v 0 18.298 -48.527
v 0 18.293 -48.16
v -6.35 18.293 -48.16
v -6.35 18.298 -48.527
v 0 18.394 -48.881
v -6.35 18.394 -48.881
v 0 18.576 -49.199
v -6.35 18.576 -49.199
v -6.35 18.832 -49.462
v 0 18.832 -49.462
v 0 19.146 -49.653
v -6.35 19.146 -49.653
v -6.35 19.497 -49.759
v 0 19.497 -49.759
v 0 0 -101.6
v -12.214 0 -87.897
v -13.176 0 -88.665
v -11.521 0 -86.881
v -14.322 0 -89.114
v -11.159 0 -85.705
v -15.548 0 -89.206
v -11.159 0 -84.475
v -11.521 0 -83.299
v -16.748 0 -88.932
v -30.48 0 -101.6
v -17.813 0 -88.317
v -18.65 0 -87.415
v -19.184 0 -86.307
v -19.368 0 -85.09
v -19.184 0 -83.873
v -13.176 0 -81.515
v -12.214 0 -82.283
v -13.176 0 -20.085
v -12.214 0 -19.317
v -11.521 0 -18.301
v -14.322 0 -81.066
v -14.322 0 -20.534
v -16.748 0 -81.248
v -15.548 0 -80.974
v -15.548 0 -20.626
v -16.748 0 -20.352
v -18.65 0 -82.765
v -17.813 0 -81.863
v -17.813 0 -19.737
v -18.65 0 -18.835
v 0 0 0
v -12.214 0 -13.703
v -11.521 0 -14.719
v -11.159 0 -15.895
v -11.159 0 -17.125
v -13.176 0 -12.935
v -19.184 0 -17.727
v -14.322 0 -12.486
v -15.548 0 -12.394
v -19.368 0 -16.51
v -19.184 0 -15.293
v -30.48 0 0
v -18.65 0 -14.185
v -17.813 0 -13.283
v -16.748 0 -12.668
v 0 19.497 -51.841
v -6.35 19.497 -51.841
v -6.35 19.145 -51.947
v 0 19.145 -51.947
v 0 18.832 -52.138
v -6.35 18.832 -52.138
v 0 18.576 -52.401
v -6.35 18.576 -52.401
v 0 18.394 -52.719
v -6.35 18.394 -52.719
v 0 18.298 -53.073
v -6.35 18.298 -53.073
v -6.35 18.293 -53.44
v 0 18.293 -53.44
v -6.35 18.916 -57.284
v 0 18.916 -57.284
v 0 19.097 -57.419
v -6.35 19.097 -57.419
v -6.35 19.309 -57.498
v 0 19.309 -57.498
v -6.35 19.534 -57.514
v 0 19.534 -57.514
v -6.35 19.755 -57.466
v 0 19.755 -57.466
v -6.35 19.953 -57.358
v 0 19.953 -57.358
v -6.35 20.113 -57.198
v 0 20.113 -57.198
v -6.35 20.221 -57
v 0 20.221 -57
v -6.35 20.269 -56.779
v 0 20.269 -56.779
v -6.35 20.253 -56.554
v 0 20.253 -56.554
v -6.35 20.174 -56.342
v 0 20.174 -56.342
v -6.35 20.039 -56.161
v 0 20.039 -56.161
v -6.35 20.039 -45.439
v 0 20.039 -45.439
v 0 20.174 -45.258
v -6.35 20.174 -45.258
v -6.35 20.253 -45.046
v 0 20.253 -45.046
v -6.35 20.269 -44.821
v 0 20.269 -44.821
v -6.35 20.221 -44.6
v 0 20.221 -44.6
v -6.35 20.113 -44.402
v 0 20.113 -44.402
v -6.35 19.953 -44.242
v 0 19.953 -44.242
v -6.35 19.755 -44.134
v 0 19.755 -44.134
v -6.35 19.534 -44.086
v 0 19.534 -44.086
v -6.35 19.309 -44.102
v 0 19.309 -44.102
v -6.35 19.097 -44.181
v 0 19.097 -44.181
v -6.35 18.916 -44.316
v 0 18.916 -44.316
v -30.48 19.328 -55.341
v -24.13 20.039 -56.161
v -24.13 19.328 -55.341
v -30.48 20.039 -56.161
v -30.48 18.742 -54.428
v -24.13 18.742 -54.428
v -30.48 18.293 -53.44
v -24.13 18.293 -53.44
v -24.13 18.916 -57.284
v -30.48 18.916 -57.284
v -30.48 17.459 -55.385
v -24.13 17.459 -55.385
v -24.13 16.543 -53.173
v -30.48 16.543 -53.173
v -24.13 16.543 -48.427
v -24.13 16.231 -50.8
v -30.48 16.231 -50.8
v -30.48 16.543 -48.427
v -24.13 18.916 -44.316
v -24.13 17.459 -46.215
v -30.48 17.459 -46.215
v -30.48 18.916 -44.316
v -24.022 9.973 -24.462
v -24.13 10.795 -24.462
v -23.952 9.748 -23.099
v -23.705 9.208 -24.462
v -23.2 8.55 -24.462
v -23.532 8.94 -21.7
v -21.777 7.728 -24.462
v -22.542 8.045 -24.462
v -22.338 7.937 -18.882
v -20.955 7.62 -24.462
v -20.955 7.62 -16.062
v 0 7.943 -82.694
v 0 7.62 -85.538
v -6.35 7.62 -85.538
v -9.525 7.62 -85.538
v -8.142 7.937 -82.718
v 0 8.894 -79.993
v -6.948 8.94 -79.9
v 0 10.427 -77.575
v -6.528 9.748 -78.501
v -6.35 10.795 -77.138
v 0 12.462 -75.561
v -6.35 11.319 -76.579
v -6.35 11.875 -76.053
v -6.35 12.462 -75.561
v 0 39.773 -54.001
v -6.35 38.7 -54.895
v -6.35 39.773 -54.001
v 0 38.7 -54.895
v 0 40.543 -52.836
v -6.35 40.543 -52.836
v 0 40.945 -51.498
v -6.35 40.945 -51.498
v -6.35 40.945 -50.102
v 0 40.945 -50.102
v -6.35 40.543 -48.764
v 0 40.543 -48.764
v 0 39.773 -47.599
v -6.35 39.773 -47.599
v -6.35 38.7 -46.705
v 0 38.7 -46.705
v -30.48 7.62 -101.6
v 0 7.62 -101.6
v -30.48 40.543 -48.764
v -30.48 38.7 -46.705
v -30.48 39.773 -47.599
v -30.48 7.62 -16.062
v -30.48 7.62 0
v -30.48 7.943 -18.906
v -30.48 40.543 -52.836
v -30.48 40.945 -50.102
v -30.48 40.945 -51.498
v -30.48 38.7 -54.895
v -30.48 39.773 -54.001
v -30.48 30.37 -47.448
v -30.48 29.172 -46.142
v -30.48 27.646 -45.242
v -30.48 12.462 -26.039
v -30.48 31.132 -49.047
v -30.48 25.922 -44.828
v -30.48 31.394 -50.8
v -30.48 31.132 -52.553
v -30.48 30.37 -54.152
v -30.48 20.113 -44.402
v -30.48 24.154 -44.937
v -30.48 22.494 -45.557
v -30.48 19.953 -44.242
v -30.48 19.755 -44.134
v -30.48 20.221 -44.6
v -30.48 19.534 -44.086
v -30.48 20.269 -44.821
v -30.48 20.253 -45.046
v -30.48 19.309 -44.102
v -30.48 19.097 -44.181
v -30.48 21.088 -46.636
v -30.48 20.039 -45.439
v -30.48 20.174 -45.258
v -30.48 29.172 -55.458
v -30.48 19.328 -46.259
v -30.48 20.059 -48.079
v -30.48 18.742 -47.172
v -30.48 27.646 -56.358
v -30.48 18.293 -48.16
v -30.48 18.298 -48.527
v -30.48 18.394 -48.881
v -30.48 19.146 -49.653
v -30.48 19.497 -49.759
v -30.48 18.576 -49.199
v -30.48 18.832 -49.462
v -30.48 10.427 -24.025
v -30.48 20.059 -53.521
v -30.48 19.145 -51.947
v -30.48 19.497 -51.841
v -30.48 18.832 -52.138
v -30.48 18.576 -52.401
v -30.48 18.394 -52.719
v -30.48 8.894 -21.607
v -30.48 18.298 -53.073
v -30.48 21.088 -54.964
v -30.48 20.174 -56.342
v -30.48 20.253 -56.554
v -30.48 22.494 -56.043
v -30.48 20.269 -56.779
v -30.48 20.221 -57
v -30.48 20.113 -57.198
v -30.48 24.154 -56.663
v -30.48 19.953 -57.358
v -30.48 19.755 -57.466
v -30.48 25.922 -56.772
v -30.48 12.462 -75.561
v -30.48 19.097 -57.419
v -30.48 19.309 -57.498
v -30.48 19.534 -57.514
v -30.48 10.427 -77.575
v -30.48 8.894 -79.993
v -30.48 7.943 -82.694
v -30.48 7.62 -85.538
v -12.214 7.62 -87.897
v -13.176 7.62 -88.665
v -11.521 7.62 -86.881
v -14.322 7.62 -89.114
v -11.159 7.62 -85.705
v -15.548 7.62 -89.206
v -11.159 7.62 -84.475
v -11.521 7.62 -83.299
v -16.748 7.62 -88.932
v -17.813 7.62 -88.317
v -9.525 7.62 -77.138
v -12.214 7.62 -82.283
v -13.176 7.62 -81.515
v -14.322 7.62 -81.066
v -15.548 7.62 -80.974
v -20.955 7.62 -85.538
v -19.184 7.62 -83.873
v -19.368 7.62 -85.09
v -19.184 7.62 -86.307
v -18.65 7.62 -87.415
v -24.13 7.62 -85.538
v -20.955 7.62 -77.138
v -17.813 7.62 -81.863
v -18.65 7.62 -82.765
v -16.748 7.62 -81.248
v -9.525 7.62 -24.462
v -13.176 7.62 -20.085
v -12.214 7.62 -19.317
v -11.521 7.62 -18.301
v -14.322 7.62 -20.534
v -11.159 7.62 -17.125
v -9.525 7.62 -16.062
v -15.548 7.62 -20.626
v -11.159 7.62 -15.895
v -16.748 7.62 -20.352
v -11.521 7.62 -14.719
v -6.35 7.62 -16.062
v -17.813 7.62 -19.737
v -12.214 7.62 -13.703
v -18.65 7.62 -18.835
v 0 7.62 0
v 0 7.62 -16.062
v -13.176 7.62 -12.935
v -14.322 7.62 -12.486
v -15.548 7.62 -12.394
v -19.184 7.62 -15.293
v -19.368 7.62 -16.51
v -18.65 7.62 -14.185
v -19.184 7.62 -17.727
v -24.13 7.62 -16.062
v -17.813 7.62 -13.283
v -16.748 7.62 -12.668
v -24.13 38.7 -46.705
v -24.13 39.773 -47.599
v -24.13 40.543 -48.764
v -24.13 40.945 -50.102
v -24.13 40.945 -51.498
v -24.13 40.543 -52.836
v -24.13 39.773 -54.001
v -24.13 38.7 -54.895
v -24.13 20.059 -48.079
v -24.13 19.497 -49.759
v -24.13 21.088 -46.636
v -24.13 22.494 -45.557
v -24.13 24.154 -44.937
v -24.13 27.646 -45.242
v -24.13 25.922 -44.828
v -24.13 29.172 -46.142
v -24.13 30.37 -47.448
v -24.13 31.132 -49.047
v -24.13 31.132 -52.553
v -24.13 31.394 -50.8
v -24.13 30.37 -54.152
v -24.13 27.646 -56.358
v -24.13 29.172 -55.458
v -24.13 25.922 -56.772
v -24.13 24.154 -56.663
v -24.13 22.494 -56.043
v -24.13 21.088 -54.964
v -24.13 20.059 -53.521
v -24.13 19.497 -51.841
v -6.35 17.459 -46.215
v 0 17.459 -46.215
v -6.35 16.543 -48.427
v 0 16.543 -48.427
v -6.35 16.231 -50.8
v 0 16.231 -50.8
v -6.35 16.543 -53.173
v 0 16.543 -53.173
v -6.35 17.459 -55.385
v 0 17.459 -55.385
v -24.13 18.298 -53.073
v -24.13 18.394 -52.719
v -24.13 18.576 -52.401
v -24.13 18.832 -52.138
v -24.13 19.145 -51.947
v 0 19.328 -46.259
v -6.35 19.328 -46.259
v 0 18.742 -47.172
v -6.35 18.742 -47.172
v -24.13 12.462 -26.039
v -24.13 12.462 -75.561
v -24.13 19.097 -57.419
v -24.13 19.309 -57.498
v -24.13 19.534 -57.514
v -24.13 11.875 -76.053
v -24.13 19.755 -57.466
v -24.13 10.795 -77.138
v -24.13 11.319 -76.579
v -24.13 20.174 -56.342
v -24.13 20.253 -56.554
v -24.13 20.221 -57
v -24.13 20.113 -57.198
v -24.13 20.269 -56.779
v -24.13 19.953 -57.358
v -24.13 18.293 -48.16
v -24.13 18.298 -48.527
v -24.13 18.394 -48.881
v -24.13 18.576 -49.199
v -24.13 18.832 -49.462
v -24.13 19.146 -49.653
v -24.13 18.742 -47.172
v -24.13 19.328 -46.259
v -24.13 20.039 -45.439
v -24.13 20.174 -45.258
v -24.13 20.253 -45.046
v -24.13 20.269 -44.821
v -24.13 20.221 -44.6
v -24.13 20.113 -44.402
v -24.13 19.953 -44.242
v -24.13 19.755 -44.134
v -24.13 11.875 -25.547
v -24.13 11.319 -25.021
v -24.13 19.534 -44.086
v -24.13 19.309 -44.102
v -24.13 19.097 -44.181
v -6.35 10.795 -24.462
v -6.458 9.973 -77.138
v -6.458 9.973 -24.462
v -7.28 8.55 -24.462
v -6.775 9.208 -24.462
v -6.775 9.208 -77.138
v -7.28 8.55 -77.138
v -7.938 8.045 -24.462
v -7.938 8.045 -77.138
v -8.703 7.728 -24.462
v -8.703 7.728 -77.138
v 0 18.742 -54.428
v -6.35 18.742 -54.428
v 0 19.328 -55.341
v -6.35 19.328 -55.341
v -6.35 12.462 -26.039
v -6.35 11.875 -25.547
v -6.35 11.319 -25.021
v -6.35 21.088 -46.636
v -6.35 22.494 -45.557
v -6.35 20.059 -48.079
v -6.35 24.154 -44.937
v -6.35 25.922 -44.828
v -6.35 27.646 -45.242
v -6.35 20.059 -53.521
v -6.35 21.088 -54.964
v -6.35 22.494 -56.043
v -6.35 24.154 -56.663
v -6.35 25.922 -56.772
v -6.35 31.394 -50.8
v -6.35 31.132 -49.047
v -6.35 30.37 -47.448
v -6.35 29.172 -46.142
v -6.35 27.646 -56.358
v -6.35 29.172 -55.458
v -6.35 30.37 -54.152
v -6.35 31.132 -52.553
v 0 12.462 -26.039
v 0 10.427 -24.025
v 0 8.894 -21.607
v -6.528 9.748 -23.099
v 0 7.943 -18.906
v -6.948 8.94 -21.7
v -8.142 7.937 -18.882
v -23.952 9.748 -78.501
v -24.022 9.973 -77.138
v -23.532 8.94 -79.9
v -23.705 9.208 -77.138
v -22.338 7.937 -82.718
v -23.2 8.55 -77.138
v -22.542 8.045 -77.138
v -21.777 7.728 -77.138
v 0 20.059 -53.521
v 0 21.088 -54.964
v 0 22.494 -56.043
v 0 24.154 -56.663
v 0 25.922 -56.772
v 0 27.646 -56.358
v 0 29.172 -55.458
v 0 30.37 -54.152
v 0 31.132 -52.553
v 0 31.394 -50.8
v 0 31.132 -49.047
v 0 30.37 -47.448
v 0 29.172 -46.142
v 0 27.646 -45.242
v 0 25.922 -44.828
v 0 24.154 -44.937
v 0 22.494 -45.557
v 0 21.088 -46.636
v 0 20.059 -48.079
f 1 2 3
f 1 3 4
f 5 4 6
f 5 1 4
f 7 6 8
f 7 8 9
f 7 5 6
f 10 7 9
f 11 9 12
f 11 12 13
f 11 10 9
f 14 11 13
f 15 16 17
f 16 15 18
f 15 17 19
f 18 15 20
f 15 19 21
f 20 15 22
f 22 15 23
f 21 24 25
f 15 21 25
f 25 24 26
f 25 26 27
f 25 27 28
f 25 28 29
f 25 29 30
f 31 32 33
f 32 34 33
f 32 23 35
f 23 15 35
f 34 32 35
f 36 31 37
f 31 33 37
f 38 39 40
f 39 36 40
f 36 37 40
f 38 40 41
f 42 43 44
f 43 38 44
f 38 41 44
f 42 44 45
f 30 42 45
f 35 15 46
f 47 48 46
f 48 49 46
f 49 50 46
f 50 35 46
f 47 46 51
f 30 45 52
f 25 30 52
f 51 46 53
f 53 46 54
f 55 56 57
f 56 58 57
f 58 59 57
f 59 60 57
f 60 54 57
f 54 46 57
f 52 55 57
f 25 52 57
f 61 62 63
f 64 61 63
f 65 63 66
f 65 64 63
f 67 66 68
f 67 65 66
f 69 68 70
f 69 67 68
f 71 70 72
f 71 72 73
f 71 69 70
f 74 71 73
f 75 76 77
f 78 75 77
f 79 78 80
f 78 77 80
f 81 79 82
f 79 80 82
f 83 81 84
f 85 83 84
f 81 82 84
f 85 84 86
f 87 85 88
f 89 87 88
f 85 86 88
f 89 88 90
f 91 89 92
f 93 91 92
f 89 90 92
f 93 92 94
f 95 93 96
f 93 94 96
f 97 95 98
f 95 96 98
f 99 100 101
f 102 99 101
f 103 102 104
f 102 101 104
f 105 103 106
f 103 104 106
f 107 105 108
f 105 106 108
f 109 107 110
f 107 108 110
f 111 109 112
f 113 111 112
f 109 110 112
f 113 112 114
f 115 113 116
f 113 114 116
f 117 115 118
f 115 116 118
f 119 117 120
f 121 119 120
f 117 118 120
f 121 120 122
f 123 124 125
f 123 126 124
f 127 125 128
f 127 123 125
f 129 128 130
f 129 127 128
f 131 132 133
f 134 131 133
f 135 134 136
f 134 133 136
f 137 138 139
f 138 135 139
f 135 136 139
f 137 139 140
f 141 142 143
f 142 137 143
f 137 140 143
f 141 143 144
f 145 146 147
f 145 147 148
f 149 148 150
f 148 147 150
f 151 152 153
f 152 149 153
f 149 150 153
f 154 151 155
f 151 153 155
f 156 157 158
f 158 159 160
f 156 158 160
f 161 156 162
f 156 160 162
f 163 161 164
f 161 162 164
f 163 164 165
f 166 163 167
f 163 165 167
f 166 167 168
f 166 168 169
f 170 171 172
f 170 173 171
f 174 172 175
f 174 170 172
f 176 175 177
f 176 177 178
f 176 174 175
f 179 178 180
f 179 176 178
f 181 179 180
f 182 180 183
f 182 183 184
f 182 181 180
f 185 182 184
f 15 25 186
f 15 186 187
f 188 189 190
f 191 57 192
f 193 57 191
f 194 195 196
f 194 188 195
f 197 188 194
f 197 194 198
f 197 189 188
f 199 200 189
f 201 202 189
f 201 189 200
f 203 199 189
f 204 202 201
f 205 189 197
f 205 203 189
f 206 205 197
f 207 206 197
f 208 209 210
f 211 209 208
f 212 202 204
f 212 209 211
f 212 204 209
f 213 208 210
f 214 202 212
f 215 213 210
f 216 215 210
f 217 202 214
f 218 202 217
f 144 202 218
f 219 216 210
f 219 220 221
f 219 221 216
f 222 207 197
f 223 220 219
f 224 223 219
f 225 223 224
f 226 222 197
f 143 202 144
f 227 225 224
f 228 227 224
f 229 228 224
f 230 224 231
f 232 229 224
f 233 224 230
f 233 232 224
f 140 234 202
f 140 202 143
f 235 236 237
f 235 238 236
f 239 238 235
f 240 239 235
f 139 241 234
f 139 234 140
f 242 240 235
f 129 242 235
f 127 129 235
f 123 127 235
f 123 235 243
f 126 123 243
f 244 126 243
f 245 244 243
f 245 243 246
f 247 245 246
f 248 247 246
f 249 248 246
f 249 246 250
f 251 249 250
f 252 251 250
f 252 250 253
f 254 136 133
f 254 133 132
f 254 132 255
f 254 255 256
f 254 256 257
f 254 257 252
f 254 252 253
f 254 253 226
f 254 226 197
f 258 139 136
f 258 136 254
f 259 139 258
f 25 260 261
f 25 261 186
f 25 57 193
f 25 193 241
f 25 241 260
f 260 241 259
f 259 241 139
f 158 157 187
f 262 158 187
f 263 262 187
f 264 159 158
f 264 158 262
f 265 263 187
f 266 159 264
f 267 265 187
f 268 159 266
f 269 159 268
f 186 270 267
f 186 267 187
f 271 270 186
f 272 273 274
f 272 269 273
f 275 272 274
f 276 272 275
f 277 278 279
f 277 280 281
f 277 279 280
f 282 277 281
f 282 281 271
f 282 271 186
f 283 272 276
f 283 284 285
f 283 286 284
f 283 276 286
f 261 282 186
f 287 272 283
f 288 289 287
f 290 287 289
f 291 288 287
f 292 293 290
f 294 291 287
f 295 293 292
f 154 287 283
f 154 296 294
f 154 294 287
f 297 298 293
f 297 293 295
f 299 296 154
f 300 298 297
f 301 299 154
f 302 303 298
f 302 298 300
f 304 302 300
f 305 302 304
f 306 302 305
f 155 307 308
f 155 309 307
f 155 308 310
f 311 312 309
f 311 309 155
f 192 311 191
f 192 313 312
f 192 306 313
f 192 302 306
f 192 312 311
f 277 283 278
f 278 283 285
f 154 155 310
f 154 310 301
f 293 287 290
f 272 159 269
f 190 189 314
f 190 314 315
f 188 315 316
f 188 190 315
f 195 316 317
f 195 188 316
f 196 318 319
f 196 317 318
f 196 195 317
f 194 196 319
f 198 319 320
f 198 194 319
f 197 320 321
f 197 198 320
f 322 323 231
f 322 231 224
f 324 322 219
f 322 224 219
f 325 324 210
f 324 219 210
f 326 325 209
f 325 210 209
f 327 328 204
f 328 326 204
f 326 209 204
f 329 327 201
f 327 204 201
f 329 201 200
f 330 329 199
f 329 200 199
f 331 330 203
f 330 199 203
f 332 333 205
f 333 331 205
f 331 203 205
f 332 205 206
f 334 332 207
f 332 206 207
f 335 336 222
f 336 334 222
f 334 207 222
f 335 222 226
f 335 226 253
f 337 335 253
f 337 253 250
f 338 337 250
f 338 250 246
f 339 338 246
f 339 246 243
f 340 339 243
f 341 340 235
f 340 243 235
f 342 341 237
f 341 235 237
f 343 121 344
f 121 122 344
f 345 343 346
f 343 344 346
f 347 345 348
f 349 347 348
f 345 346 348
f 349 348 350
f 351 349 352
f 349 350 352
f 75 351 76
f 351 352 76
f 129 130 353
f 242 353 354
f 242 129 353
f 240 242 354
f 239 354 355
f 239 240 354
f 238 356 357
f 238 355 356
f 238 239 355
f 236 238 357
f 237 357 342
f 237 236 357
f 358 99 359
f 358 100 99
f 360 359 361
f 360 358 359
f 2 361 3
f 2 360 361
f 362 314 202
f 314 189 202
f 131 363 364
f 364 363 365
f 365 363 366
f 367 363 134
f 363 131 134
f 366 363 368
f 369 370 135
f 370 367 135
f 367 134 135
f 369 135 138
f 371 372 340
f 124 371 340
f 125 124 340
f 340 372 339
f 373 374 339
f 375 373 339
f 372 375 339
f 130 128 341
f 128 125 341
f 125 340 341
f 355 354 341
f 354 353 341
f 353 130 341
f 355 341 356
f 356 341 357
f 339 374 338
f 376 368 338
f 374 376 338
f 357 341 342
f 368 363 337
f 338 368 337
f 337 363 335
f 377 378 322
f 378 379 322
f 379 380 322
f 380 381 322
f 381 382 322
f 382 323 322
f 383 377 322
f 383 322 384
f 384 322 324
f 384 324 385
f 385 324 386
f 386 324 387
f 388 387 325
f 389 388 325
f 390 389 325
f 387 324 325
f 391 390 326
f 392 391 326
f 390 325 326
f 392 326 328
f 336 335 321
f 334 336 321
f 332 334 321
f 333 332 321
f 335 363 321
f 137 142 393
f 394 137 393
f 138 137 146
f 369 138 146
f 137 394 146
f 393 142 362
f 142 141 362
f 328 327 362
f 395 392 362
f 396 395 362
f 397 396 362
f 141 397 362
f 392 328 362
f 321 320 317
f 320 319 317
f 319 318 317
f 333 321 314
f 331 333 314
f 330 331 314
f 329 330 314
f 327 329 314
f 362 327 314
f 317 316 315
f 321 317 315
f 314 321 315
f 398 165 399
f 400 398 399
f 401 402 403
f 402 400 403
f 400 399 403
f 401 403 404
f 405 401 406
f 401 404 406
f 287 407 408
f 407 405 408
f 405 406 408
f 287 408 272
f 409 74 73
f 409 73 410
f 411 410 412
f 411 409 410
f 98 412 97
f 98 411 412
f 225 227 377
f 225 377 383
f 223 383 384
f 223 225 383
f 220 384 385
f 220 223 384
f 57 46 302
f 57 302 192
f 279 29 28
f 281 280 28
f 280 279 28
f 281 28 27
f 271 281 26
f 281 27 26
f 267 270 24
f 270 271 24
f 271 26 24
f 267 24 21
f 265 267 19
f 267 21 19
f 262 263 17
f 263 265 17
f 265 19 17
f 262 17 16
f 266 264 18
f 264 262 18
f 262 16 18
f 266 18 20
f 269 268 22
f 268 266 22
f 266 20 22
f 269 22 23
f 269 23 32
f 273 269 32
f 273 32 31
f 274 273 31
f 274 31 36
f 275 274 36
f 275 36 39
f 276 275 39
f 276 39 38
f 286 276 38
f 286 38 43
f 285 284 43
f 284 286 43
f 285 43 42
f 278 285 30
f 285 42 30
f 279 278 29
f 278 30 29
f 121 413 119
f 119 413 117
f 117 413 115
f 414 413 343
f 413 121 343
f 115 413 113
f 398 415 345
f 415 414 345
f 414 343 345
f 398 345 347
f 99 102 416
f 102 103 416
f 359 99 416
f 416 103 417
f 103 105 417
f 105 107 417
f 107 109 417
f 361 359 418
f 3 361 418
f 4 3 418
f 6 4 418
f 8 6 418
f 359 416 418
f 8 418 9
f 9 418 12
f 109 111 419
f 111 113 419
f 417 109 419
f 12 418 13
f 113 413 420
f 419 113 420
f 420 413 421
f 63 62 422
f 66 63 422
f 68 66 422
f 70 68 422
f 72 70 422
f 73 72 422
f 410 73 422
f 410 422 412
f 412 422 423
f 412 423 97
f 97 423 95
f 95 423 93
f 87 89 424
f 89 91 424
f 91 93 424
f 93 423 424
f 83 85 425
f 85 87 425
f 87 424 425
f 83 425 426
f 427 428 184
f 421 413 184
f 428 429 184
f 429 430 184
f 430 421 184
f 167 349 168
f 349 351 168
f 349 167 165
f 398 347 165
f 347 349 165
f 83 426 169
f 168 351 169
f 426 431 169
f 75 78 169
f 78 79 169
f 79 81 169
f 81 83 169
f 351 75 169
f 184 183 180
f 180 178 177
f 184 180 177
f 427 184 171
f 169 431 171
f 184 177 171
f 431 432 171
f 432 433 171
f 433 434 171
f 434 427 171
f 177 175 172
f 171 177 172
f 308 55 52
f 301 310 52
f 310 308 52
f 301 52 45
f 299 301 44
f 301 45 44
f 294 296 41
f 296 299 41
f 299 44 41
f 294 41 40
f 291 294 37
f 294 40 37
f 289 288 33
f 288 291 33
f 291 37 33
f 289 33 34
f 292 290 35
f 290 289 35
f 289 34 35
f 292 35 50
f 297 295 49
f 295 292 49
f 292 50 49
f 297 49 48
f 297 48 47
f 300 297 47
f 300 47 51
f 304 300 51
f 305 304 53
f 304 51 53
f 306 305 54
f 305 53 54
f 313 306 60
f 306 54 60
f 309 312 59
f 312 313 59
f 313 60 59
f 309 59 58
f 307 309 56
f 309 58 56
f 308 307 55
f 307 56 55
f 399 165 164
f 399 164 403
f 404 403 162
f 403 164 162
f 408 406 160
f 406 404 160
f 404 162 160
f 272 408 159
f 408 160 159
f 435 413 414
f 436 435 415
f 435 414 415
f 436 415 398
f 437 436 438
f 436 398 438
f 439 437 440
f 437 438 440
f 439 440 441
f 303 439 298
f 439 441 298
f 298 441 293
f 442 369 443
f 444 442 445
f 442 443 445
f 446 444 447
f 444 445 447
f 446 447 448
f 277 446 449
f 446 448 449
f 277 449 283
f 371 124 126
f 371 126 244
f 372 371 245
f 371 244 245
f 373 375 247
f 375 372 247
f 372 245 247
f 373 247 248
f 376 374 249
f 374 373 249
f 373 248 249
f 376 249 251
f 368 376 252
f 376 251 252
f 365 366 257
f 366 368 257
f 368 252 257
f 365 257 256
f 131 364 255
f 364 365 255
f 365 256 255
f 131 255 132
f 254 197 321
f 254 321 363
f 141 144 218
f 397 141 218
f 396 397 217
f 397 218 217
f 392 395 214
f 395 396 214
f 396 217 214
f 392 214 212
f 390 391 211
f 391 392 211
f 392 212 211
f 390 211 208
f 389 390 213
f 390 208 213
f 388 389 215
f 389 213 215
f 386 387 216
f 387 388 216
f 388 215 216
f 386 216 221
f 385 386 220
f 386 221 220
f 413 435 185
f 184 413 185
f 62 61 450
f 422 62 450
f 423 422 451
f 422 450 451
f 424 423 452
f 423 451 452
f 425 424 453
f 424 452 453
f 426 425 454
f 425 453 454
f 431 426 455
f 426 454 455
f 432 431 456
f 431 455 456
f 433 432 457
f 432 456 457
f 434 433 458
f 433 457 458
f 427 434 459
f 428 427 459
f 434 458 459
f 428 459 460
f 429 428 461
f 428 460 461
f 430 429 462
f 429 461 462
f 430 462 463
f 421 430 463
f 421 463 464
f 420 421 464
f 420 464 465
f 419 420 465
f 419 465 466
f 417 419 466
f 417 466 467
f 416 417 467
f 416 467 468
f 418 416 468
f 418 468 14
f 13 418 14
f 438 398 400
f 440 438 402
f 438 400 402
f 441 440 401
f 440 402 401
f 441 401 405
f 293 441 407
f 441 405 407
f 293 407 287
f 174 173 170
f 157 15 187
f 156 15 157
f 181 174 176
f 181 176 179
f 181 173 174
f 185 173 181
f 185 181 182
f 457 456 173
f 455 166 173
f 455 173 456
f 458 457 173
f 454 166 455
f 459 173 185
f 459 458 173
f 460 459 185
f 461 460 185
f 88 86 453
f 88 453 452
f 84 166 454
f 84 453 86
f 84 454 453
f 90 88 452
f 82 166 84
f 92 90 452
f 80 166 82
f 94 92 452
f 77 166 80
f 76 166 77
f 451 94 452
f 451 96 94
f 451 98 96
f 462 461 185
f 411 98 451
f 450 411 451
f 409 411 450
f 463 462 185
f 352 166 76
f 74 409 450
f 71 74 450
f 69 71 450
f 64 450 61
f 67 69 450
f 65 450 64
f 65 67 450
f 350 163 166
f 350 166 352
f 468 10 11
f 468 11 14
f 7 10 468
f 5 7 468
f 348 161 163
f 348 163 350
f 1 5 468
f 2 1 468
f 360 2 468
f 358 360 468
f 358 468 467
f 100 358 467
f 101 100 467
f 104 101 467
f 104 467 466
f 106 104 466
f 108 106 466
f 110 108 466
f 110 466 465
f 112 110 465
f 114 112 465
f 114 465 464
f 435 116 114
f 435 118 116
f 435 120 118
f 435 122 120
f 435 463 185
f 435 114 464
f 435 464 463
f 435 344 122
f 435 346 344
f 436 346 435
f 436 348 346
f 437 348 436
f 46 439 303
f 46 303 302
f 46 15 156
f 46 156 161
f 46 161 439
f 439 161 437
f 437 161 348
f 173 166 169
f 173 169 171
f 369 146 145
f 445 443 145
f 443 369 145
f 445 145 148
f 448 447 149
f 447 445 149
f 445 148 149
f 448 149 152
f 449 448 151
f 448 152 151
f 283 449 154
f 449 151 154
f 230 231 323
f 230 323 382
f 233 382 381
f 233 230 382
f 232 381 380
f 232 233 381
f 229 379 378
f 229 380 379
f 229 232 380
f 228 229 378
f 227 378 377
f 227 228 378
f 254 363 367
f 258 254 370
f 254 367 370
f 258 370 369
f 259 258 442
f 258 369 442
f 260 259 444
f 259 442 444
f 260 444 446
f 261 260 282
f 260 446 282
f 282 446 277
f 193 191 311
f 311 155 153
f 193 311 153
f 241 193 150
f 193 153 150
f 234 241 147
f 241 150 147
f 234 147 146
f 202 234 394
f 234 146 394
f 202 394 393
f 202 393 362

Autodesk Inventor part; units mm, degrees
ref_plane "YZ Plane" through (0, 0, 0) normal (1, 0, 0) x (0, 1, 0)
ref_plane "XZ Plane" through (0, 0, 0) normal (0, 1, 0) x (-1, 0, 0)
sketch "Sketch1" plane through (0, 0, 0) normal (0, 1, 0) x (-1, 0, 0)
  line L0 (0, 0) -> (30.48, 0)
  line L1 (30.48, 0) -> (30.48, -101.6)
  line L2 (30.48, -101.6) -> (0, -101.6)
  line L3 (0, -101.6) -> (0, 0)
  circle A0 centre (15.24, -16.51) radius 4.1275
  circle A1 centre (15.24, -85.09) radius 4.1275
  dimension "d0" = 30.48
  dimension "d1" = 101.6
  dimension "d4" = 8.255
  dimension "d5" = 8.255
extrude "Extrusion1" add sketch "Sketch1" along normal blind 7.62
sketch "Sketch2" plane through (0, 0, 0) normal (1, 0, 0) x (0, 0, -1)
  line L0 (0, 0) -> (0, 7.62) projected
  line L1 (0, 7.62) -> (101.6, 7.62) projected
  line L2 (0, 7.62) -> (101.6, 7.62)
  arc A0 (51.8409, 19.4967) -> (49.7591, 19.4967) centre (50.8, 25.4) ccw
  arc A1 (44.3162, 18.9162) -> (57.2837, 18.9163) centre (50.8, 25.4) ccw
  line L3 (50.8, 25.4) -> (59.9694, 25.4) construction
  line L4 (50.8, 25.4) -> (59.9694, 25.4) construction
  arc A2 (45.4388, 20.0388) -> (44.3162, 18.9162) centre (44.8775, 19.4775) ccw
  arc A3 (57.2837, 18.9163) -> (56.1612, 20.0388) centre (56.7225, 19.4775) ccw
  line L5 (50.8, 25.4) -> (58.3819, 25.4) construction
  arc A4 (48.1597, 18.2927) -> (49.7591, 19.4967) centre (48.3236, 19.7391) ccw
  arc A5 (51.8409, 19.4967) -> (53.4403, 18.2927) centre (53.2763, 19.7391) ccw
  arc A6 (45.4388, 20.0388) -> (48.1597, 18.2927) centre (50.8, 25.4) ccw
  arc A7 (53.4403, 18.2927) -> (56.1612, 20.0388) centre (50.8, 25.4) ccw
  line L6 (50.8, 7.62) -> (22.225, 7.62)
  arc A8 (54.8949, 38.7005) -> (46.7051, 38.7005) centre (50.8, 36.195) ccw
  line L7 (22.225, 7.62) -> (46.7051, 38.7005)
  line L8 (50.8, 7.62) -> (79.375, 7.62)
  line L9 (79.375, 7.62) -> (54.8949, 38.7005)
  dimension "d16" = 28.575
  dimension "d17" = 28.575
extrude "Extrusion2" add sketch "Sketch2" against normal blind 6.35
ref_plane "Work Plane1" through (-15.24, 0, -101.6) normal (-1, 0, 0) x (0, 0, 1)
mirror "Mirror1" about plane through (-15.24, 0, -101.6) normal (-1, 0, 0) of "Extrusion2"
fillet "Fillet1" radius 12.7 4 edges at (-3.175, 7.62, -79.375) (-27.305, 7.62, -79.375) (-27.305, 7.62, -22.225) (-3.175, 7.62, -22.225)
fillet "Fillet3" radius 3.175 2 edges at (-24.13, 7.62, -50.8) (-6.35, 7.62, -50.8)
properties part number "TestingBracket"
